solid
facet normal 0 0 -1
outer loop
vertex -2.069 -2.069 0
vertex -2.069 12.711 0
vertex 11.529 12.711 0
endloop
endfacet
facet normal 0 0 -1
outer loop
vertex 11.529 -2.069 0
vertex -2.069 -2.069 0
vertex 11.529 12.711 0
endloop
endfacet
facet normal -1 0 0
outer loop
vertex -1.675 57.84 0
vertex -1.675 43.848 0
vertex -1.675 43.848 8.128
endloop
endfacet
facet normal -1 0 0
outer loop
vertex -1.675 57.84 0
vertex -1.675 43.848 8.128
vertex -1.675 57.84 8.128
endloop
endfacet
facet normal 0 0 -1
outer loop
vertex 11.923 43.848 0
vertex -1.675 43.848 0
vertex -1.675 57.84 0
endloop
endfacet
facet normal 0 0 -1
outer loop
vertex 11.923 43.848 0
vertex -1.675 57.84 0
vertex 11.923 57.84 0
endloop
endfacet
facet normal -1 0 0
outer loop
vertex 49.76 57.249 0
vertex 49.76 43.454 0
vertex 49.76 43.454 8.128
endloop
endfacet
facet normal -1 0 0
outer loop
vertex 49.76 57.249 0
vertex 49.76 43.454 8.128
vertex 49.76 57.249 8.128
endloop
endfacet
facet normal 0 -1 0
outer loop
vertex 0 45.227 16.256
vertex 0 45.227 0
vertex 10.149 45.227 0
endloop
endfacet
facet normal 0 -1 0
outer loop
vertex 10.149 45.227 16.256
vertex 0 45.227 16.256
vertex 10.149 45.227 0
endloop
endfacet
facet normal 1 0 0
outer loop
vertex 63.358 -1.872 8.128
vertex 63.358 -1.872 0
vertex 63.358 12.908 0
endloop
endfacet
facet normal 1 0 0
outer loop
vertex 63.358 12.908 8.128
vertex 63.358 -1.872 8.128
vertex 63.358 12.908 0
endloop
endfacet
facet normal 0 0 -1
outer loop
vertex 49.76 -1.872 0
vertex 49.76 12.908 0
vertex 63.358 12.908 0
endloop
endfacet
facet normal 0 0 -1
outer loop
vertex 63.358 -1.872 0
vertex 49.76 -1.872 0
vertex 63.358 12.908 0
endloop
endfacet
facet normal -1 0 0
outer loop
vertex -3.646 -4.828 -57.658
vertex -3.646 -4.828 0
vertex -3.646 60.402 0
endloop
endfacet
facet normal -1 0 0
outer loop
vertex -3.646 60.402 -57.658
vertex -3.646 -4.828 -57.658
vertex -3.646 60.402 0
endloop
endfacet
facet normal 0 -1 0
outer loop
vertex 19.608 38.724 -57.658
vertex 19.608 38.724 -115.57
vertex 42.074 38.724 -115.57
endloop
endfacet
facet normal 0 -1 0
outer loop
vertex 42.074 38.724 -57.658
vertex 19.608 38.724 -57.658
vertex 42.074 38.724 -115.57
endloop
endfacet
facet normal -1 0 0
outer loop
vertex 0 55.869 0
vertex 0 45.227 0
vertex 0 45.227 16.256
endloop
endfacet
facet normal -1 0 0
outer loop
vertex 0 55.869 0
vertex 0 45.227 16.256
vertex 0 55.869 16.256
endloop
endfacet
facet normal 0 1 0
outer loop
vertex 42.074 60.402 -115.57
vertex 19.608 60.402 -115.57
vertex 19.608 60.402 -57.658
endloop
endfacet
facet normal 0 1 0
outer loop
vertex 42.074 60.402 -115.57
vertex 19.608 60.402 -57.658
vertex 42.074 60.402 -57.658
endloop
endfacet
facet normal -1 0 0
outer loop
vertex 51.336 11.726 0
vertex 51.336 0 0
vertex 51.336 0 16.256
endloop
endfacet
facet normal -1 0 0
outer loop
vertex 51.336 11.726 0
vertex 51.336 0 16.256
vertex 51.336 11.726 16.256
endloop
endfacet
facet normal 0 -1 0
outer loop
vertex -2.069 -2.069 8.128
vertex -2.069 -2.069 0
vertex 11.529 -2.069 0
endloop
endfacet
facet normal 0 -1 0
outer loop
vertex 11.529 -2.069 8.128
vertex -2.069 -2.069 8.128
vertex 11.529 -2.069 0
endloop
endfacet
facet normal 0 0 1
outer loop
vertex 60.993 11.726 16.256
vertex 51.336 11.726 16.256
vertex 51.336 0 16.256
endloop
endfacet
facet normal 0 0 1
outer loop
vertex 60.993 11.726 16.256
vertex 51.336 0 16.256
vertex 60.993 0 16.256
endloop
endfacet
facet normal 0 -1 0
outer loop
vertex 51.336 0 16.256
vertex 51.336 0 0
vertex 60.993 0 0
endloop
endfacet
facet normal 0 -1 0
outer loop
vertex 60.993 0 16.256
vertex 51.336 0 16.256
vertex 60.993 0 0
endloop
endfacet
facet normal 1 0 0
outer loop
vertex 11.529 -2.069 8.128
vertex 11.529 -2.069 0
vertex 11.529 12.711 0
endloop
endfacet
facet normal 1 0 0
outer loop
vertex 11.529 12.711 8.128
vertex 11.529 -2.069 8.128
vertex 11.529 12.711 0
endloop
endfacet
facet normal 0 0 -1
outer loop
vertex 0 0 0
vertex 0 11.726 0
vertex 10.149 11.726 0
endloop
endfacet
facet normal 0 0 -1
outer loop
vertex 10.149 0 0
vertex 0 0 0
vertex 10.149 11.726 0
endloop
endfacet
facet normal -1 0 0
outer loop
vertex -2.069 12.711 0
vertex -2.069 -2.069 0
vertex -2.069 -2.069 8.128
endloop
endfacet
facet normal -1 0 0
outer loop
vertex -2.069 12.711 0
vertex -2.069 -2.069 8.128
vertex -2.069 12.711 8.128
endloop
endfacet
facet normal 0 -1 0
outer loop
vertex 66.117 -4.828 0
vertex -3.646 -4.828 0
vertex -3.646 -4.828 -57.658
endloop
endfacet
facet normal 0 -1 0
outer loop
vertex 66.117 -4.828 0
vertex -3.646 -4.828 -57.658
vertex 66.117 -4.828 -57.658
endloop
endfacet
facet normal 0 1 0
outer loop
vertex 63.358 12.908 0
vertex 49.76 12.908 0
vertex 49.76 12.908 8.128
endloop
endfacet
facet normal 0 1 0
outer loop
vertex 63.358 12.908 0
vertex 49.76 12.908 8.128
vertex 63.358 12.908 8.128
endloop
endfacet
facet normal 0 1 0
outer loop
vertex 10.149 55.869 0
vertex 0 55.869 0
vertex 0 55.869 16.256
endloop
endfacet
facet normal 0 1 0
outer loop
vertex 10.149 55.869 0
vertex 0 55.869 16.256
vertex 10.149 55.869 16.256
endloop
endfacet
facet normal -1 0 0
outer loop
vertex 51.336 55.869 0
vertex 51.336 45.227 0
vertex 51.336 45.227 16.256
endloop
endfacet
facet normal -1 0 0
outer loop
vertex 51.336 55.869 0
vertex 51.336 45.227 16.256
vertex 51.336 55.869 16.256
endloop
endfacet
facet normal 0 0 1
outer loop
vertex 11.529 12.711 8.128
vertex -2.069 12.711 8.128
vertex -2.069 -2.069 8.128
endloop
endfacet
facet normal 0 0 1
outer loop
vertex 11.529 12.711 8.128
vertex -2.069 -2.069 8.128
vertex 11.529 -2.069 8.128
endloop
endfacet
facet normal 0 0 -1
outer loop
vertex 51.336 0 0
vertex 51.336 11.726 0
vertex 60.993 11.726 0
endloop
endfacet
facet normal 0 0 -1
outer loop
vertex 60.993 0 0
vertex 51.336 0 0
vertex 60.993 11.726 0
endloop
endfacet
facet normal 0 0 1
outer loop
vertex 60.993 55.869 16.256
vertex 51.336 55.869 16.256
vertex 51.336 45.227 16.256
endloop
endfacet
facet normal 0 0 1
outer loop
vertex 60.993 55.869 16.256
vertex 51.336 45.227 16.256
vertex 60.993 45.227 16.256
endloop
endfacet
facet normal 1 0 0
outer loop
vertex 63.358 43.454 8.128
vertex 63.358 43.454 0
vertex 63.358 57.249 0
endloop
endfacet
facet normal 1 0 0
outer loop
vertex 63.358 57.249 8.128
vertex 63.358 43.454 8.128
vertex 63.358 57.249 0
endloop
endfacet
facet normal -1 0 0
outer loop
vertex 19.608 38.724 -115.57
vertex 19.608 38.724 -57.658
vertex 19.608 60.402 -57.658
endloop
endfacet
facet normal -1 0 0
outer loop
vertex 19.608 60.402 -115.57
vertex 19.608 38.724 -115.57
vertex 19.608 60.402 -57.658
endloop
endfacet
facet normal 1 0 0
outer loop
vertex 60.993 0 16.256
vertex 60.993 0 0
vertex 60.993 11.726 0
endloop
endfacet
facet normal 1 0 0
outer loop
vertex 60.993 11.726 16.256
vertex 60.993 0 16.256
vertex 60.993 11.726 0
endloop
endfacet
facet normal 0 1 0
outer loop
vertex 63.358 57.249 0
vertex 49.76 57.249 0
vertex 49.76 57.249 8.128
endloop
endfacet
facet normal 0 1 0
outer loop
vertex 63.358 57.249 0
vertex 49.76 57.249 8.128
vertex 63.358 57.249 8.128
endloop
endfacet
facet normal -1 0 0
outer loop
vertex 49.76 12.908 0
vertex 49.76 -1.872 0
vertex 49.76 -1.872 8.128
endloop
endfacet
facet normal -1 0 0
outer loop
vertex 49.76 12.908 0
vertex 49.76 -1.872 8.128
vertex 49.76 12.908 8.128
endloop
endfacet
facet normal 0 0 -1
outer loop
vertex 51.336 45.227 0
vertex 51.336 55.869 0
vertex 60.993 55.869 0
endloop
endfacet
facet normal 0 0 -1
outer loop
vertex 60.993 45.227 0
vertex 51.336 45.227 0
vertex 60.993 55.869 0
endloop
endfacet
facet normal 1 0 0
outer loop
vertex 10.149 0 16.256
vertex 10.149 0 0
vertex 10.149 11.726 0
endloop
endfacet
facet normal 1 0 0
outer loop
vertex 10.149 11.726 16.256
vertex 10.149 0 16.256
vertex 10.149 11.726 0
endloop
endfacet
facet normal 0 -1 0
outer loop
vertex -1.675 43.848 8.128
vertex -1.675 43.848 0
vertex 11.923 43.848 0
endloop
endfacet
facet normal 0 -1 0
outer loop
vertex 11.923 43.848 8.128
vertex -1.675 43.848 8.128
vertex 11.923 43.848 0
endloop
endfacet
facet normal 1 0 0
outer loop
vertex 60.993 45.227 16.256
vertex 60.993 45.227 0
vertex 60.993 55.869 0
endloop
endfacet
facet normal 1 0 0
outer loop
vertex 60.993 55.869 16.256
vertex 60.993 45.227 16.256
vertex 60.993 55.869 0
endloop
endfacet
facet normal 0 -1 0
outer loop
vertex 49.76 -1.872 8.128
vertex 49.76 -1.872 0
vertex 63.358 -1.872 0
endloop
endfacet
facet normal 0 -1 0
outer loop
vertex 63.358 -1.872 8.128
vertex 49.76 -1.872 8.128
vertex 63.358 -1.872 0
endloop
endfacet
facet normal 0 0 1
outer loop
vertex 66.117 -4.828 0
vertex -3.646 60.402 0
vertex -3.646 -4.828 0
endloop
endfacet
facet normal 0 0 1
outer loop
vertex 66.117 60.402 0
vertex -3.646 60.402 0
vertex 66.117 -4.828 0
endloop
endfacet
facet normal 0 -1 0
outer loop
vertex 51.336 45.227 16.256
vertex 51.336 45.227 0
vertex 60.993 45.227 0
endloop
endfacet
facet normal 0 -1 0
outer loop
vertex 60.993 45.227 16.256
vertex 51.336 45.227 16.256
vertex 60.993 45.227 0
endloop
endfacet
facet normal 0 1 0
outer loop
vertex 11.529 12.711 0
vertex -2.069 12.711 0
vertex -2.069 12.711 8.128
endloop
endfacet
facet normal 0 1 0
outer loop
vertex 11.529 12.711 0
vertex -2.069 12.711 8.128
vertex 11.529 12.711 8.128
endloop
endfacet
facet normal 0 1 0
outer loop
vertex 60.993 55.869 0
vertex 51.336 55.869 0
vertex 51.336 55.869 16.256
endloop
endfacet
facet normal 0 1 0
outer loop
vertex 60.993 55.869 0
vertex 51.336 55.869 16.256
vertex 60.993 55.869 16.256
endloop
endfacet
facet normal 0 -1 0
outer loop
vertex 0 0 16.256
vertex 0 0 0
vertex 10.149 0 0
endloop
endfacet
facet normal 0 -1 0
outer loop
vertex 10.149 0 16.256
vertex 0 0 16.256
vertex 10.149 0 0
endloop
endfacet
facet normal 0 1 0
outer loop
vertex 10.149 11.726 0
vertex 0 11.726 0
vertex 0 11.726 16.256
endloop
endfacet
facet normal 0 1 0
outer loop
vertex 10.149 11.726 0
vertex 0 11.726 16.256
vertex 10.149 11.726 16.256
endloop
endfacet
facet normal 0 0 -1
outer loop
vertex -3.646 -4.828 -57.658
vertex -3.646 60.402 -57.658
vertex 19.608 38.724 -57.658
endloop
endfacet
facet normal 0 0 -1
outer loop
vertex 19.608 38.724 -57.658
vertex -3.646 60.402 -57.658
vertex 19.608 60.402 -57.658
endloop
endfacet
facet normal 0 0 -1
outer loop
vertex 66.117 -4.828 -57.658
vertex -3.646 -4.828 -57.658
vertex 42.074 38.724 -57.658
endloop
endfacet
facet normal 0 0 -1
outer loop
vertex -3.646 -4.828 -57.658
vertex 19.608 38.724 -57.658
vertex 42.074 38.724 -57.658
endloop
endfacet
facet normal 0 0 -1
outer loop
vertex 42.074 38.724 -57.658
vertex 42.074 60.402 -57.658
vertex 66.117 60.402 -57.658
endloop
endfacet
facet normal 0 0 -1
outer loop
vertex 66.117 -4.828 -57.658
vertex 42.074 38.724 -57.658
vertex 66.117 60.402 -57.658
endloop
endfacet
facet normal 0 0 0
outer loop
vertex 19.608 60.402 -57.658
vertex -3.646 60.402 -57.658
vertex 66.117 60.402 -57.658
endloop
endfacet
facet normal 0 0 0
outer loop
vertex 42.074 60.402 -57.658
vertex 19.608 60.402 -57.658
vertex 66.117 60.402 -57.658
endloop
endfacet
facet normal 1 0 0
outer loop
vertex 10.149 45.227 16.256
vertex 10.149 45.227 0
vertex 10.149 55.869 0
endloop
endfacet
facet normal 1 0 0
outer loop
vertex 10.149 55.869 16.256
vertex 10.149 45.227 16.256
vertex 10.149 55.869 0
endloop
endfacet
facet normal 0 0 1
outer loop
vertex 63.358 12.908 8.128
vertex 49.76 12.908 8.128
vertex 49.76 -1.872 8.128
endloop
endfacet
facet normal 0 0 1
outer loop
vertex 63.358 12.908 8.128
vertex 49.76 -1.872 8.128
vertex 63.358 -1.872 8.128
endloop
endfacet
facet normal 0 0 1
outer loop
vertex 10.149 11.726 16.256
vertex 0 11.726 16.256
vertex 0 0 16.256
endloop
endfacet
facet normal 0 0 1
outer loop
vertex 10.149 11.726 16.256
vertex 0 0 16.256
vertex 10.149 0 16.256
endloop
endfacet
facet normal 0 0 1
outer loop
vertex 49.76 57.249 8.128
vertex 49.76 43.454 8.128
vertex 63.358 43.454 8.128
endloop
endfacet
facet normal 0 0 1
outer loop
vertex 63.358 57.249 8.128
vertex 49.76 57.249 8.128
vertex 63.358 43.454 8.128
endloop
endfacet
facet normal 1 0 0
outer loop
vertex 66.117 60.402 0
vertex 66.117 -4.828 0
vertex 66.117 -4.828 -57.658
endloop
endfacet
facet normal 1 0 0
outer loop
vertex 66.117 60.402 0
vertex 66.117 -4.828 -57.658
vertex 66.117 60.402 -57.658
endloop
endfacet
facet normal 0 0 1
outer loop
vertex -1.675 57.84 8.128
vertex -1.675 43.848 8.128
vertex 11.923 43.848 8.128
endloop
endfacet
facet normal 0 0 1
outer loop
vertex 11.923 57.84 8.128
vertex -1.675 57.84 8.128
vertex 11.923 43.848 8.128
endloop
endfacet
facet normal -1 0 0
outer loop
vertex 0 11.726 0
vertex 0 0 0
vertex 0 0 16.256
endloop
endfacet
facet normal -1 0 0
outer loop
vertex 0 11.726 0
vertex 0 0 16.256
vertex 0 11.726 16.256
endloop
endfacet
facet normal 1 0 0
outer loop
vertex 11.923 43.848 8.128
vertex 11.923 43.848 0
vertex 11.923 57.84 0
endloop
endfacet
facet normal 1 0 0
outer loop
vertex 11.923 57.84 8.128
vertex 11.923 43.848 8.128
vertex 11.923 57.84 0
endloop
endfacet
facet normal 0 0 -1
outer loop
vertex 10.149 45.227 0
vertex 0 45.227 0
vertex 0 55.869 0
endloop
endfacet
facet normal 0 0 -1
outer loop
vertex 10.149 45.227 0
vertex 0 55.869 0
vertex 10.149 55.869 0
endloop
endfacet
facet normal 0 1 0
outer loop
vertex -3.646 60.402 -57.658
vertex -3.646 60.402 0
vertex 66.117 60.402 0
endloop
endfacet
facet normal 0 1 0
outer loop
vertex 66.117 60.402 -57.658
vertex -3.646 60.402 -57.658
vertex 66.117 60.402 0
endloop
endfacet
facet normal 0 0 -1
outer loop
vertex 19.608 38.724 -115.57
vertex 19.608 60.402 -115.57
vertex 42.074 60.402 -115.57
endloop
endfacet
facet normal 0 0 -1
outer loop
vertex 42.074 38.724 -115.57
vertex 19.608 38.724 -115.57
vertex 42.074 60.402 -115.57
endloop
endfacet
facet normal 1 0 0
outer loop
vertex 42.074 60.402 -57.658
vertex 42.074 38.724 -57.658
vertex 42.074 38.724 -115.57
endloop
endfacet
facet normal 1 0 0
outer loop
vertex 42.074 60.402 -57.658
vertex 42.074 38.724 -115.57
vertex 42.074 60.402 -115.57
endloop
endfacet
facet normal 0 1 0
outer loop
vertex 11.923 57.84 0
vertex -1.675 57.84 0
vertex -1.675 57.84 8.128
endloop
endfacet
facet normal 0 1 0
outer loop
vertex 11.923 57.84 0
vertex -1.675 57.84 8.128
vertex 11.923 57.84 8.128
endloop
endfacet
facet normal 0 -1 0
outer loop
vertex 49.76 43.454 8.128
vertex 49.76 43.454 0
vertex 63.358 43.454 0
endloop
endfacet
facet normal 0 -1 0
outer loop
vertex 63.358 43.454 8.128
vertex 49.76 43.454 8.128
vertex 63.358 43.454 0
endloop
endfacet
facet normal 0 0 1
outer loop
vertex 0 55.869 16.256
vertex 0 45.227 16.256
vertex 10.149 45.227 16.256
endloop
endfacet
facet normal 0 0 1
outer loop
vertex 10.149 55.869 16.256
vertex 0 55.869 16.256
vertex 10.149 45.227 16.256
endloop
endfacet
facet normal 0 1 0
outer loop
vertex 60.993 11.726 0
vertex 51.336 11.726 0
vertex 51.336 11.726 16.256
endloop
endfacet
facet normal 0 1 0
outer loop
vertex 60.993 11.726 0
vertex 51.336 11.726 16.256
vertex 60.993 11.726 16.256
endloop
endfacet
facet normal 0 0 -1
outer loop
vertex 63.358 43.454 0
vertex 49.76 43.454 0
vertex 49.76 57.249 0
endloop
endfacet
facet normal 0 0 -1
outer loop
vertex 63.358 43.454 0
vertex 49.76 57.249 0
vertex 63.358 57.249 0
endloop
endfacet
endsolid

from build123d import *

# Parameters (mm, degrees)
F0_W     = 10.149051
F0_H     = 11.725604
F0_W_2   = 9.656384
F0_H_2   = 10.641724
F1_DEPTH = 16.256
F2_W     = 13.597761
F2_H     = 13.794825
F2_H_2   = 14.780173
F2_W_2   = 13.597758
F2_H_3   = 13.9919
F3_DEPTH = 8.128
F4_W     = 69.762415
F4_H     = 65.229826
F5_DEPTH = 57.658
F6_W     = 22.465862
F6_H     = 21.677583
F7_DEPTH = 115.57


with BuildPart() as f1:
    # F0 (on Top) → F1 (new body)
    with BuildSketch(Plane.XY):
        with Locations((5.074526, 5.862802)):
            Rectangle(F0_W, F0_H)
        with Locations((56.164656, 5.862802)):
            Rectangle(F0_W_2, F0_H)
        with Locations((56.164656, 50.548192)):
            Rectangle(F0_W_2, F0_H_2)
        with Locations((5.074526, 50.548192)):
            Rectangle(F0_W, F0_H_2)
    extrude(amount=F1_DEPTH)


with BuildPart() as f3:
    # F2 (on Top) → F3 (new body)
    with BuildSketch(Plane.XY):
        with Locations((56.558793, 50.35112)):
            Rectangle(F2_W, F2_H)
        with Locations((56.558793, 5.517932)):
            Rectangle(F2_W, F2_H_2)
        with Locations((4.729655, 5.320862)):
            Rectangle(F2_W, F2_H_2)
        with Locations((5.123792, 50.843794)):
            Rectangle(F2_W_2, F2_H_3)
    extrude(amount=F3_DEPTH)


with BuildPart() as f5:
    # F4 (on Top) → F5 (new body)
    with BuildSketch(Plane.XY):
        with Locations((31.23543, 27.786724)):
            Rectangle(F4_W, F4_H)
    extrude(amount=-F5_DEPTH)

    # F6 (on Top) → F7 (join)
    with BuildSketch(Plane.XY):
        with Locations((30.841295, 49.562845)):
            Rectangle(F6_W, F6_H)
    extrude(amount=-F7_DEPTH)


solid = Compound([f1.part, f3.part, f5.part])
